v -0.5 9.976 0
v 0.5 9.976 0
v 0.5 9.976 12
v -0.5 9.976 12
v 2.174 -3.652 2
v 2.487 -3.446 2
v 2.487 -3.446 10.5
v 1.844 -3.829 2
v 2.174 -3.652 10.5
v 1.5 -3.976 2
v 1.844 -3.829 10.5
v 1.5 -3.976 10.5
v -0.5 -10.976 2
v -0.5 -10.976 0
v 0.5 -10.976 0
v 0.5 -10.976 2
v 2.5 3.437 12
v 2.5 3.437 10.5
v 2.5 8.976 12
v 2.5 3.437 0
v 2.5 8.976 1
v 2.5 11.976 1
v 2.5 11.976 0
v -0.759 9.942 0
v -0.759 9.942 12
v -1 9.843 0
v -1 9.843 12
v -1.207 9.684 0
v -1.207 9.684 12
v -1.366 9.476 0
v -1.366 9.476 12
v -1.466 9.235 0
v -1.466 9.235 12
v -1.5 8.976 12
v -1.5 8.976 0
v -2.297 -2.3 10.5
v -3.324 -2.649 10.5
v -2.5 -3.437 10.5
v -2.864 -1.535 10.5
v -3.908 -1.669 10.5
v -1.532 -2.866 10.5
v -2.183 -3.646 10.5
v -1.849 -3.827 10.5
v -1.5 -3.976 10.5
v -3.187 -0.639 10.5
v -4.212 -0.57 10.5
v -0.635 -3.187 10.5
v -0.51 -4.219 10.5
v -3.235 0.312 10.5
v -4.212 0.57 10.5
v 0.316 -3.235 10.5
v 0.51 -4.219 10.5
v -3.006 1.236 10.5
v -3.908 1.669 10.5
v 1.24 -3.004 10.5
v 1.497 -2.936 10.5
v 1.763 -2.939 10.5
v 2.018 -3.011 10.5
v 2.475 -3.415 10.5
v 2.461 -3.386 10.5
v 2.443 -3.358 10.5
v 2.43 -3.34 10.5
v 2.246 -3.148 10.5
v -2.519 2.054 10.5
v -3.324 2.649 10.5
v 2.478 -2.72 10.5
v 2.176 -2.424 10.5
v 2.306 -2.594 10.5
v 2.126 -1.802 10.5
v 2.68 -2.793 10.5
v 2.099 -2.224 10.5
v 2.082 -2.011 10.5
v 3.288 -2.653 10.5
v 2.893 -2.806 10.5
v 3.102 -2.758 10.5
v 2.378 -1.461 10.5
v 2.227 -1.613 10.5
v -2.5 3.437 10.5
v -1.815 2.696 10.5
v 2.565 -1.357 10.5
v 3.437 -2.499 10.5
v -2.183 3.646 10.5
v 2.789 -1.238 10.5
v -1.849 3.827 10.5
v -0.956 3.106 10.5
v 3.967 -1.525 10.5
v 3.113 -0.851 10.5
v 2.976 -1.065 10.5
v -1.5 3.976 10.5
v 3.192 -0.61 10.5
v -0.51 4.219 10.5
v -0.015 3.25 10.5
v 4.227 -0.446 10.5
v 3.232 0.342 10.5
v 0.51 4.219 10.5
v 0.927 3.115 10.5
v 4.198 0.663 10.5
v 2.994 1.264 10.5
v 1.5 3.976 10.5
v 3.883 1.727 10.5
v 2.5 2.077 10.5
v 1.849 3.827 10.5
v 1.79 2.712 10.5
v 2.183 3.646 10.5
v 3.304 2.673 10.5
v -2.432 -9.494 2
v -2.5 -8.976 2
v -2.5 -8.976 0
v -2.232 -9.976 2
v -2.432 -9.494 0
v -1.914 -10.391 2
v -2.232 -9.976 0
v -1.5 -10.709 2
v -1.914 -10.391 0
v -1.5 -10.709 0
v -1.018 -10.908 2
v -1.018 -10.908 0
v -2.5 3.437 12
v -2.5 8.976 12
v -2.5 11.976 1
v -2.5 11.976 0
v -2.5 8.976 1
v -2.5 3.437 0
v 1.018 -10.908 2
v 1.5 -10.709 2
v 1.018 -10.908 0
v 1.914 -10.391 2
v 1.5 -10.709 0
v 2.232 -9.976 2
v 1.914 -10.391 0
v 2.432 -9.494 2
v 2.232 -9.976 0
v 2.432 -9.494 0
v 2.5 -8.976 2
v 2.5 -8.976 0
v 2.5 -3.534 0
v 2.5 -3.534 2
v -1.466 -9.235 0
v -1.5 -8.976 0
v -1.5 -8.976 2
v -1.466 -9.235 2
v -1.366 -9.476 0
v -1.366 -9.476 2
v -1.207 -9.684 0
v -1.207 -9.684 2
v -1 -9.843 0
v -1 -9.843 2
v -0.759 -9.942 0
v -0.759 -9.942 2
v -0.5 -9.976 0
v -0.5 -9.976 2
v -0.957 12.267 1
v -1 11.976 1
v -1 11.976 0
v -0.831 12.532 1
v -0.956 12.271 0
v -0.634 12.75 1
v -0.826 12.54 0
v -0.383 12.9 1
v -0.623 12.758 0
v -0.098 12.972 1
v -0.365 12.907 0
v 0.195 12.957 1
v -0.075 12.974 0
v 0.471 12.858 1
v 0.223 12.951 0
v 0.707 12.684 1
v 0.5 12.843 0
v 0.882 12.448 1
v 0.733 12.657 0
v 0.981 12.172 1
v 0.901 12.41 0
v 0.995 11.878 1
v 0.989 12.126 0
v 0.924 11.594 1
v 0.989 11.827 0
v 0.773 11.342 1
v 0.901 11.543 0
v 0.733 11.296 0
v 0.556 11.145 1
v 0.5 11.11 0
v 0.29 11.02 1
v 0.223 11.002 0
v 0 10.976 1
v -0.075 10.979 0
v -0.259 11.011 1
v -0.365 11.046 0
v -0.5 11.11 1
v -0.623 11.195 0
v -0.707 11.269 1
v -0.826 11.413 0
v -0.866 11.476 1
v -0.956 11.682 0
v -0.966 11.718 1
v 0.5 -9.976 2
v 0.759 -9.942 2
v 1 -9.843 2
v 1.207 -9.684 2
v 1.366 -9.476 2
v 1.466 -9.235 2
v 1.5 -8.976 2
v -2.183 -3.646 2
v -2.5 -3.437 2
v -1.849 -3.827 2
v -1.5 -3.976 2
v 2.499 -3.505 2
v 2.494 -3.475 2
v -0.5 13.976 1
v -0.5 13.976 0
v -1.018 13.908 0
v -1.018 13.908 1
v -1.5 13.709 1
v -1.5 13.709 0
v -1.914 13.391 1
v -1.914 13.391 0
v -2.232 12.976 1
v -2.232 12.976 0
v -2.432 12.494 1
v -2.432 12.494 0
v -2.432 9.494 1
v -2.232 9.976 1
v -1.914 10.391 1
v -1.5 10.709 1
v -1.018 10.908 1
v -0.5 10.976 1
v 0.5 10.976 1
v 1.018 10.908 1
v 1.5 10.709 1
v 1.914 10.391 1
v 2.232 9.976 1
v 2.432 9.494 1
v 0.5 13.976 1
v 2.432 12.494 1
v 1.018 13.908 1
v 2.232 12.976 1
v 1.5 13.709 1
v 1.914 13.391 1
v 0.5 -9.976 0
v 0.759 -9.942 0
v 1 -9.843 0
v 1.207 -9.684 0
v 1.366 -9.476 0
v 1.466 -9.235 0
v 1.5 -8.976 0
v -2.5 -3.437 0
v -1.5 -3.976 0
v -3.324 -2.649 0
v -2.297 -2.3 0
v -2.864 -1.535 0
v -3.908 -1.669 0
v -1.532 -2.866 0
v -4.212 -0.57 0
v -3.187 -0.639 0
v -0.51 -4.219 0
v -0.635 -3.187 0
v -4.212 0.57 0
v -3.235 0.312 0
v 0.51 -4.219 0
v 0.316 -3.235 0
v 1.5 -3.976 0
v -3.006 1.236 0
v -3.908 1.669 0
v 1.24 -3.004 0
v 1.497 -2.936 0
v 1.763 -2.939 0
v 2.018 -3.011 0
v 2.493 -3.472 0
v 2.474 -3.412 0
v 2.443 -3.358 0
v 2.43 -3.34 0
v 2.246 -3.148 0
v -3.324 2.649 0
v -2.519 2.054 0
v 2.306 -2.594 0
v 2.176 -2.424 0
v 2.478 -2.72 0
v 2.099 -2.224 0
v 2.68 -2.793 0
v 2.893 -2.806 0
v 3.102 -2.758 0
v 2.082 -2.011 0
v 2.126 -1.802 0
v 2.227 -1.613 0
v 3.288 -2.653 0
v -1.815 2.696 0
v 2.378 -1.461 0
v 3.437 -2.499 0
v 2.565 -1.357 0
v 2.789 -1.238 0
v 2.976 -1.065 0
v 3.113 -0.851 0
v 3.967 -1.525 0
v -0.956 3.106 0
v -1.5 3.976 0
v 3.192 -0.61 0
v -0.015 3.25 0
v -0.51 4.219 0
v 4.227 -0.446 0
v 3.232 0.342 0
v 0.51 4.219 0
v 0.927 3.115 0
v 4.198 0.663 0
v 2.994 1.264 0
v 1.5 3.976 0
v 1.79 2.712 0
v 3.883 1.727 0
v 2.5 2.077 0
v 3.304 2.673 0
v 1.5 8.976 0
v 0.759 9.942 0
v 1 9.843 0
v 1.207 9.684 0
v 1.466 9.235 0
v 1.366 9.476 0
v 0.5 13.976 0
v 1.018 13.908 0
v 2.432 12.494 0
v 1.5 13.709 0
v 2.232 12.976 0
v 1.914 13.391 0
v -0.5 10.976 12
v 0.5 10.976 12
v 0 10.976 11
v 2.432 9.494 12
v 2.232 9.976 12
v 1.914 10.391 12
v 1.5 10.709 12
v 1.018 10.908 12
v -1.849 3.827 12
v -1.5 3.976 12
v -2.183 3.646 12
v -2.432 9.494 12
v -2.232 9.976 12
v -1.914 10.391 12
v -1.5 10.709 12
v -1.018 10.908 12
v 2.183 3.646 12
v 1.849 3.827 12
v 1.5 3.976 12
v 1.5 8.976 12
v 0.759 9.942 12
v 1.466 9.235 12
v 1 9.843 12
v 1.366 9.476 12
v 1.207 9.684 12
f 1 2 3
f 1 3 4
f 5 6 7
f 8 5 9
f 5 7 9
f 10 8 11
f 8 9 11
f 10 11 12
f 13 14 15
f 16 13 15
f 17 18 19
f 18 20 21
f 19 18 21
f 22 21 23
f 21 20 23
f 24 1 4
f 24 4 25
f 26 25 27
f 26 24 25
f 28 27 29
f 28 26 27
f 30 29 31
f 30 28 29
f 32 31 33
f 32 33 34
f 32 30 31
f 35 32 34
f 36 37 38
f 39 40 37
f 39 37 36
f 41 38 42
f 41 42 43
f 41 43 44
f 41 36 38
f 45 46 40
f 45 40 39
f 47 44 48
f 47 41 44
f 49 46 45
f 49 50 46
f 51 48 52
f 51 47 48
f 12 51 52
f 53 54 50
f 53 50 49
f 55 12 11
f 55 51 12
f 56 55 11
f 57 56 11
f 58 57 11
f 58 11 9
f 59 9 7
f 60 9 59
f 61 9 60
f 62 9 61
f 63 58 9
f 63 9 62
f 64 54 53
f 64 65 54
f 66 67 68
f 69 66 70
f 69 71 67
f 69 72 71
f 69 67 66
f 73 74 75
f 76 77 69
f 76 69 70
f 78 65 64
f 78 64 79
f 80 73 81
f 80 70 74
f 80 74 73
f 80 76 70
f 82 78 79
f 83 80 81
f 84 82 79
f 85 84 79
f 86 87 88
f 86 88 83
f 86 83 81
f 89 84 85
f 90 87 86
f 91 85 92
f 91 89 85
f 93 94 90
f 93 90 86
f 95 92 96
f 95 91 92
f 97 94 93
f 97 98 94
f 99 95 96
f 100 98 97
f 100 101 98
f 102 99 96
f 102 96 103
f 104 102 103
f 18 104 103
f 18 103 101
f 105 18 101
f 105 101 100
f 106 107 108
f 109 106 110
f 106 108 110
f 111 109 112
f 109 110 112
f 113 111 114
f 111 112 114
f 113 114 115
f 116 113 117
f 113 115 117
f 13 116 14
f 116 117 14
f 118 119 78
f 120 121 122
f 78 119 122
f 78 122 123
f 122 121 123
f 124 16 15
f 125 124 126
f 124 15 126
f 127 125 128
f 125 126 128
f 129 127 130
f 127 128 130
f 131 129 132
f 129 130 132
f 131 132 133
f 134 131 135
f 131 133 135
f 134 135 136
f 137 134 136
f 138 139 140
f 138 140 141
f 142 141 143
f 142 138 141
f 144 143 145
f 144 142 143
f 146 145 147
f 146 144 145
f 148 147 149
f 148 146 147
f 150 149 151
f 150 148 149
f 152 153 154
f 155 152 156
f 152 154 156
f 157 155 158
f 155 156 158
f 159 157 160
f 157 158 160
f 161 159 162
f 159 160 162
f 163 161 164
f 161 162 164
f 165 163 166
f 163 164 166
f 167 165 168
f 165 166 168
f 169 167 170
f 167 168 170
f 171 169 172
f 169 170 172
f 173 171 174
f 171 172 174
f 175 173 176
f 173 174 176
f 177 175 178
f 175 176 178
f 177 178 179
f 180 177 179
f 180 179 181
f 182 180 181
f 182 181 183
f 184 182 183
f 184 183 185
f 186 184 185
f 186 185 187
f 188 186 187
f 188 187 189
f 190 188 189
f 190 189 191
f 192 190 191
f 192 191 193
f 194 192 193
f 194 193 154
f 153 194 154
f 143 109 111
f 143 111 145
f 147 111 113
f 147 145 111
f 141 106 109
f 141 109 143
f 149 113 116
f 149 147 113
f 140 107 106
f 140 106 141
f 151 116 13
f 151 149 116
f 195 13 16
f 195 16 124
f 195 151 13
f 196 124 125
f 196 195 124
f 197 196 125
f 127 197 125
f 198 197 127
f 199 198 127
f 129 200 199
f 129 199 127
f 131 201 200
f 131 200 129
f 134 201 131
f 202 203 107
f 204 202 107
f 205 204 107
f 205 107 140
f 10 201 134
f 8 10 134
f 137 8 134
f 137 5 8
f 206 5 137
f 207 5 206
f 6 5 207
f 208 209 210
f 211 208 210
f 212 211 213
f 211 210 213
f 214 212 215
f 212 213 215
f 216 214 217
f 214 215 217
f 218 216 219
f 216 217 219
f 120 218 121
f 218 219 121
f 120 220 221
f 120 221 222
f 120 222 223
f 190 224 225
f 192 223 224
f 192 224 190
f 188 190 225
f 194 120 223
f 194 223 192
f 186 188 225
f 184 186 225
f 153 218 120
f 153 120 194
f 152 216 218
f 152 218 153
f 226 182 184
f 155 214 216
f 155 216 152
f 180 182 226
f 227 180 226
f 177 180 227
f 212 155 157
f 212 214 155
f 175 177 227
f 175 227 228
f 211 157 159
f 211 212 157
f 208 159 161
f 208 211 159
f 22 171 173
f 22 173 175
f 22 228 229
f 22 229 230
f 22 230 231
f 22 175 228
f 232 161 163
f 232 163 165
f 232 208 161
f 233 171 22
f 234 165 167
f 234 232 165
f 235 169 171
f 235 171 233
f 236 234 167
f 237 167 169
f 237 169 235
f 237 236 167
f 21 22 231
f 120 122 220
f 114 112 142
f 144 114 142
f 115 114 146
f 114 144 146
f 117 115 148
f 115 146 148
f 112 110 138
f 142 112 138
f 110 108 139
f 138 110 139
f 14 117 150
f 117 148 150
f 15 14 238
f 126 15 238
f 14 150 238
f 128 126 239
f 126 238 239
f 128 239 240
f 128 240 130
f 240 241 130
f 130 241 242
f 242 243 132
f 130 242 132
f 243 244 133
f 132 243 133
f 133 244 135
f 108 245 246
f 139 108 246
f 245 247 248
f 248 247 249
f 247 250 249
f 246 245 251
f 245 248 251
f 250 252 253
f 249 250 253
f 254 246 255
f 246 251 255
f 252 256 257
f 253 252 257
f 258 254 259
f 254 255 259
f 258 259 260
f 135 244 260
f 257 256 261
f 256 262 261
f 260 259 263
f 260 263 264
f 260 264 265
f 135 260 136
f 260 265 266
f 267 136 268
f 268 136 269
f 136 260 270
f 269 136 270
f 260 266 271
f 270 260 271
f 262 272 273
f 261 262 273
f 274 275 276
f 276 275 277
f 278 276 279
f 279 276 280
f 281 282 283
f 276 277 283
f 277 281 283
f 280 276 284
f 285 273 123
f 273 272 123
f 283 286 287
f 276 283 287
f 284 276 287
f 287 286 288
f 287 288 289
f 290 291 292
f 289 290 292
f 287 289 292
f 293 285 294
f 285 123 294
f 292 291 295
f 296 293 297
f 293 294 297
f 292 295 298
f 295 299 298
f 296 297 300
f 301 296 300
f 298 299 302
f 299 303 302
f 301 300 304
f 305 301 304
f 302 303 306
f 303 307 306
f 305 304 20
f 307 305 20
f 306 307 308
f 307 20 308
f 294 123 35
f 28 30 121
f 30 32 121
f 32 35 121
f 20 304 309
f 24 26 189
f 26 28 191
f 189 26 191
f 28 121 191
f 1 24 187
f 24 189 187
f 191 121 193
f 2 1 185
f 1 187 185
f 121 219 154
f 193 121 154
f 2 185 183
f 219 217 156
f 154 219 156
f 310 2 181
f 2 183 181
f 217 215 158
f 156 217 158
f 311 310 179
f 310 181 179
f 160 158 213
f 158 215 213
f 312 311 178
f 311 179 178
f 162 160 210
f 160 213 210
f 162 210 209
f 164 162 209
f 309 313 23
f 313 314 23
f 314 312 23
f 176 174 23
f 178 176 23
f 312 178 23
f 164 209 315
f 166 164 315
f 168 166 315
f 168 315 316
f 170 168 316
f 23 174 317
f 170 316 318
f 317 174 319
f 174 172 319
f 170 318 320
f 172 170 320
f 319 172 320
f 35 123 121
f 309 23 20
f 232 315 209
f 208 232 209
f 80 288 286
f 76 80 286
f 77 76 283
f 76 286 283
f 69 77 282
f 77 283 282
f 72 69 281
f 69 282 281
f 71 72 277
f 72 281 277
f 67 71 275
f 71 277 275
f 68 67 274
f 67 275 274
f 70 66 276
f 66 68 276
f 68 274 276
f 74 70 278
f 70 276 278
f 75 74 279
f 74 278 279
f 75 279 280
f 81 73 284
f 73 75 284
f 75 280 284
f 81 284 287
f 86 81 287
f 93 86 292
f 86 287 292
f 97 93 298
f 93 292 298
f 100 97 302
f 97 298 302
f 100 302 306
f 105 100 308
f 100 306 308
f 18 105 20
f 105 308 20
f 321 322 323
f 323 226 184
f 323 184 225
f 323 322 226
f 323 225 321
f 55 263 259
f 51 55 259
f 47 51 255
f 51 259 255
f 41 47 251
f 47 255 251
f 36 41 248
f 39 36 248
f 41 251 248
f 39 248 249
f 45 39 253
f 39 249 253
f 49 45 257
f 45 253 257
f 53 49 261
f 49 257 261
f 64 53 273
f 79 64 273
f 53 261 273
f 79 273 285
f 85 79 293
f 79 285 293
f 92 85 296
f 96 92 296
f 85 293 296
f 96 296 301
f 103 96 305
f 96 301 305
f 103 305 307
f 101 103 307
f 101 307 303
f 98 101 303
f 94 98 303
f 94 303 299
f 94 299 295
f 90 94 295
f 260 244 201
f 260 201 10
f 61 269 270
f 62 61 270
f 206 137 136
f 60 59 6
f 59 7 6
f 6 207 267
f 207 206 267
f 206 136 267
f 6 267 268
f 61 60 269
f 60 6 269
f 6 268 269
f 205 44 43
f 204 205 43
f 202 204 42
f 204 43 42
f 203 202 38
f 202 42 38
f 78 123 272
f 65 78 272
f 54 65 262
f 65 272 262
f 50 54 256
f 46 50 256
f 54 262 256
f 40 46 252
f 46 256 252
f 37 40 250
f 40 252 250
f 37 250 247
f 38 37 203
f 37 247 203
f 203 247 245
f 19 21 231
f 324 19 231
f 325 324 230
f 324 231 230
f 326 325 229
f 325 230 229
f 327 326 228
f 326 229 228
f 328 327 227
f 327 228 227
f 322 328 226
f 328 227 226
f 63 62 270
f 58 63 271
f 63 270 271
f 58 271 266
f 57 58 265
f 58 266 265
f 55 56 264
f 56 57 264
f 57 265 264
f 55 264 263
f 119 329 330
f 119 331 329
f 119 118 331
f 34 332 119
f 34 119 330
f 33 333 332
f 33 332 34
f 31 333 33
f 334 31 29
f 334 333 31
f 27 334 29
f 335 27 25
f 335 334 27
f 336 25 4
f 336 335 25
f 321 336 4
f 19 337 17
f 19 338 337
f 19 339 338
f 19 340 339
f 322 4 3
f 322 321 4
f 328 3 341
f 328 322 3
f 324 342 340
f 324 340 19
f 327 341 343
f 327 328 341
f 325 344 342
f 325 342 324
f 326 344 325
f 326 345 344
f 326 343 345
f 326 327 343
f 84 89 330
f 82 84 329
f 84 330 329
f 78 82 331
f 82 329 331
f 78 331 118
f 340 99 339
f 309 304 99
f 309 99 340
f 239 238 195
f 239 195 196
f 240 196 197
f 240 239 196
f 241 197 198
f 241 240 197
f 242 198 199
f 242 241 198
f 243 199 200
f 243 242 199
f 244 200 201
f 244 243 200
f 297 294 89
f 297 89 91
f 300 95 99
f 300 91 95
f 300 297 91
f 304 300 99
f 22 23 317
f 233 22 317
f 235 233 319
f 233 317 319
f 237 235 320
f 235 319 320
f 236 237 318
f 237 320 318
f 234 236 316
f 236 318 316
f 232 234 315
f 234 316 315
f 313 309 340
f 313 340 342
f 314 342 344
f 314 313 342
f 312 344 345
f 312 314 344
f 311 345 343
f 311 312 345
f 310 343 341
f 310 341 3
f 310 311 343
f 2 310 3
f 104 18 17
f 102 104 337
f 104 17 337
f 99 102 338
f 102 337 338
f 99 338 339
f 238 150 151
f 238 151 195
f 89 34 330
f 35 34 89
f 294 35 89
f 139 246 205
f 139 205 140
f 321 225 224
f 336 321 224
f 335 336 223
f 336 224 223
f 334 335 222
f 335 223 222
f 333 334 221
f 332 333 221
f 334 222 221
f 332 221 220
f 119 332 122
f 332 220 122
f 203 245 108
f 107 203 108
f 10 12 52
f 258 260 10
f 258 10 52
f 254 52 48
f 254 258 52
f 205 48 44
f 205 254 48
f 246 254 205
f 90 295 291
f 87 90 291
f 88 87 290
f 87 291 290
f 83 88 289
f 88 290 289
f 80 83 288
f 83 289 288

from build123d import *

# Parameters (mm, degrees)
Y_KSEKLIK_EKSTR_ZYON1_DEPTH = 12
KES_EKSTR_ZYON1_DEPTH       = 10
Y_KSEKLIK_EKSTR_ZYON7_DEPTH = 1
IZIM4_R                     = 1
KES_EKSTR_ZYON2_DEPTH       = 11
IZIM6_R                     = 4.25
KES_EKSTR_ZYON3_DEPTH       = 1.5


with BuildPart() as part:
    # Çizim1 → Yükseklik-Ekstrüzyon1 (new body)
    with BuildSketch(Plane.XY):
        with BuildLine():
            ThreePointArc((3.192280857, -0.60978925), (2.975857359, -1.065220637), (2.56471968, -1.357149888))
            ThreePointArc((2.56471968, -1.357149888), (2.234721924, -2.513666231), (3.437313781, -2.499474739))
            ThreePointArc((3.437313781, -2.499474739), (4.19799408, 0.662831579), (2.5, 3.436931771))
            Line((2.5, 3.436931771), (2.5, 8.97649343))
            ThreePointArc((2.5, 8.97649343), (1.914213562, 10.390706993), (0.5, 10.97649343))
            Line((0.5, 10.97649343), (-0.5, 10.97649343))
            ThreePointArc((-0.5, 10.97649343), (-1.914213562, 10.390706993), (-2.5, 8.97649343))
            Line((-2.5, 8.97649343), (-2.5, 3.436931771))
            ThreePointArc((-2.5, 3.436931771), (-4.25, 0), (-2.5, -3.436931771))
            Line((-2.5, -3.436931771), (-2.5, -8.97649343))
            ThreePointArc((-2.5, -8.97649343), (-1.914213562, -10.390706993), (-0.5, -10.97649343))
            Line((-0.5, -10.97649343), (0.5, -10.97649343))
            ThreePointArc((0.5, -10.97649343), (1.914213562, -10.390706993), (2.5, -8.97649343))
            Line((2.5, -8.97649343), (2.5, -3.534499959))
            ThreePointArc((2.5, -3.534499959), (2.485291154, -3.44171549), (2.442606949, -3.35802937))
            Line((2.442606949, -3.35802937), (2.429810536, -3.340437211))
            ThreePointArc((2.429810536, -3.340437211), (1.892940792, -2.966324418), (1.239680541, -3.004278975))
            ThreePointArc((1.239680541, -3.004278975), (-2.518723033, 2.053907077), (3.192280857, -0.60978925))
        make_face()
        with BuildLine():
            Line((1.5, 3.97649343), (1.5, 8.97649343))
            ThreePointArc((1.5, 8.97649343), (1.207106781, 9.683600211), (0.5, 9.97649343))
            Line((0.5, 9.97649343), (-0.5, 9.97649343))
            ThreePointArc((-0.5, 9.97649343), (-1.207106781, 9.683600211), (-1.5, 8.97649343))
            Line((-1.5, 8.97649343), (-1.5, 3.97649343))
            ThreePointArc((-1.5, 3.97649343), (0, 4.25), (1.5, 3.97649343))
        make_face(mode=Mode.SUBTRACT)
        with BuildLine():
            ThreePointArc((0.5, -9.97649343), (1.207106781, -9.683600211), (1.5, -8.97649343))
            Line((1.5, -8.97649343), (1.5, -3.97649343))
            ThreePointArc((1.5, -3.97649343), (0, -4.25), (-1.5, -3.97649343))
            Line((-1.5, -3.97649343), (-1.5, -8.97649343))
            ThreePointArc((-1.5, -8.97649343), (-1.207106781, -9.683600211), (-0.5, -9.97649343))
            Line((-0.5, -9.97649343), (0.5, -9.97649343))
        make_face(mode=Mode.SUBTRACT)
    extrude(amount=Y_KSEKLIK_EKSTR_ZYON1_DEPTH)

    # Çizim2 → Kes-Ekstrüzyon1 (cut)
    with BuildSketch(Plane.XY.offset(12)):
        with BuildLine():
            Line((-2.5, -3.436931771), (-2.5, -10.97649343))
            Line((-2.5, -10.97649343), (2.5, -10.97649343))
            Line((2.5, -10.97649343), (2.5, -3.436931771))
            ThreePointArc((2.5, -3.436931771), (0, -4.25), (-2.5, -3.436931771))
        make_face()
    extrude(amount=-KES_EKSTR_ZYON1_DEPTH, mode=Mode.SUBTRACT)

    # Çizim3 → Yükseklik-Ekstrüzyon7 (add)
    with BuildSketch(Plane(origin=(0, 0, 0), x_dir=(-1, 0, 0), z_dir=(0, 0, -1))):
        with BuildLine():
            ThreePointArc((-2.5, 11.97649343), (-1.914213562, 13.390706993), (-0.5, 13.97649343))
            Line((-0.5, 13.97649343), (0.5, 13.97649343))
            ThreePointArc((0.5, 13.97649343), (1.914213562, 13.390706993), (2.5, 11.97649343))
            Line((2.5, 11.97649343), (2.5, 8.97649343))
            ThreePointArc((2.5, 8.97649343), (1.914213562, 10.390706993), (0.5, 10.97649343))
            Line((0.5, 10.97649343), (-0.5, 10.97649343))
            ThreePointArc((-0.5, 10.97649343), (-1.914213562, 10.390706993), (-2.5, 8.97649343))
            Line((-2.5, 8.97649343), (-2.5, 11.97649343))
        make_face()
    extrude(amount=-Y_KSEKLIK_EKSTR_ZYON7_DEPTH)

    # Çizim4 → Kes-Ekstrüzyon2 (cut)
    with BuildSketch(Plane(origin=(0, 0, 0), x_dir=(-1, 0, 0), z_dir=(0, 0, -1))):
        with Locations((0, 11.97649343)):
            Circle(IZIM4_R)
    extrude(amount=-KES_EKSTR_ZYON2_DEPTH, mode=Mode.SUBTRACT)

    # Çizim6 → Kes-Ekstrüzyon3 (cut)
    with BuildSketch(Plane.XY.offset(12)):
        Circle(IZIM6_R)
    extrude(amount=-KES_EKSTR_ZYON3_DEPTH, mode=Mode.SUBTRACT)


solid = part.part
